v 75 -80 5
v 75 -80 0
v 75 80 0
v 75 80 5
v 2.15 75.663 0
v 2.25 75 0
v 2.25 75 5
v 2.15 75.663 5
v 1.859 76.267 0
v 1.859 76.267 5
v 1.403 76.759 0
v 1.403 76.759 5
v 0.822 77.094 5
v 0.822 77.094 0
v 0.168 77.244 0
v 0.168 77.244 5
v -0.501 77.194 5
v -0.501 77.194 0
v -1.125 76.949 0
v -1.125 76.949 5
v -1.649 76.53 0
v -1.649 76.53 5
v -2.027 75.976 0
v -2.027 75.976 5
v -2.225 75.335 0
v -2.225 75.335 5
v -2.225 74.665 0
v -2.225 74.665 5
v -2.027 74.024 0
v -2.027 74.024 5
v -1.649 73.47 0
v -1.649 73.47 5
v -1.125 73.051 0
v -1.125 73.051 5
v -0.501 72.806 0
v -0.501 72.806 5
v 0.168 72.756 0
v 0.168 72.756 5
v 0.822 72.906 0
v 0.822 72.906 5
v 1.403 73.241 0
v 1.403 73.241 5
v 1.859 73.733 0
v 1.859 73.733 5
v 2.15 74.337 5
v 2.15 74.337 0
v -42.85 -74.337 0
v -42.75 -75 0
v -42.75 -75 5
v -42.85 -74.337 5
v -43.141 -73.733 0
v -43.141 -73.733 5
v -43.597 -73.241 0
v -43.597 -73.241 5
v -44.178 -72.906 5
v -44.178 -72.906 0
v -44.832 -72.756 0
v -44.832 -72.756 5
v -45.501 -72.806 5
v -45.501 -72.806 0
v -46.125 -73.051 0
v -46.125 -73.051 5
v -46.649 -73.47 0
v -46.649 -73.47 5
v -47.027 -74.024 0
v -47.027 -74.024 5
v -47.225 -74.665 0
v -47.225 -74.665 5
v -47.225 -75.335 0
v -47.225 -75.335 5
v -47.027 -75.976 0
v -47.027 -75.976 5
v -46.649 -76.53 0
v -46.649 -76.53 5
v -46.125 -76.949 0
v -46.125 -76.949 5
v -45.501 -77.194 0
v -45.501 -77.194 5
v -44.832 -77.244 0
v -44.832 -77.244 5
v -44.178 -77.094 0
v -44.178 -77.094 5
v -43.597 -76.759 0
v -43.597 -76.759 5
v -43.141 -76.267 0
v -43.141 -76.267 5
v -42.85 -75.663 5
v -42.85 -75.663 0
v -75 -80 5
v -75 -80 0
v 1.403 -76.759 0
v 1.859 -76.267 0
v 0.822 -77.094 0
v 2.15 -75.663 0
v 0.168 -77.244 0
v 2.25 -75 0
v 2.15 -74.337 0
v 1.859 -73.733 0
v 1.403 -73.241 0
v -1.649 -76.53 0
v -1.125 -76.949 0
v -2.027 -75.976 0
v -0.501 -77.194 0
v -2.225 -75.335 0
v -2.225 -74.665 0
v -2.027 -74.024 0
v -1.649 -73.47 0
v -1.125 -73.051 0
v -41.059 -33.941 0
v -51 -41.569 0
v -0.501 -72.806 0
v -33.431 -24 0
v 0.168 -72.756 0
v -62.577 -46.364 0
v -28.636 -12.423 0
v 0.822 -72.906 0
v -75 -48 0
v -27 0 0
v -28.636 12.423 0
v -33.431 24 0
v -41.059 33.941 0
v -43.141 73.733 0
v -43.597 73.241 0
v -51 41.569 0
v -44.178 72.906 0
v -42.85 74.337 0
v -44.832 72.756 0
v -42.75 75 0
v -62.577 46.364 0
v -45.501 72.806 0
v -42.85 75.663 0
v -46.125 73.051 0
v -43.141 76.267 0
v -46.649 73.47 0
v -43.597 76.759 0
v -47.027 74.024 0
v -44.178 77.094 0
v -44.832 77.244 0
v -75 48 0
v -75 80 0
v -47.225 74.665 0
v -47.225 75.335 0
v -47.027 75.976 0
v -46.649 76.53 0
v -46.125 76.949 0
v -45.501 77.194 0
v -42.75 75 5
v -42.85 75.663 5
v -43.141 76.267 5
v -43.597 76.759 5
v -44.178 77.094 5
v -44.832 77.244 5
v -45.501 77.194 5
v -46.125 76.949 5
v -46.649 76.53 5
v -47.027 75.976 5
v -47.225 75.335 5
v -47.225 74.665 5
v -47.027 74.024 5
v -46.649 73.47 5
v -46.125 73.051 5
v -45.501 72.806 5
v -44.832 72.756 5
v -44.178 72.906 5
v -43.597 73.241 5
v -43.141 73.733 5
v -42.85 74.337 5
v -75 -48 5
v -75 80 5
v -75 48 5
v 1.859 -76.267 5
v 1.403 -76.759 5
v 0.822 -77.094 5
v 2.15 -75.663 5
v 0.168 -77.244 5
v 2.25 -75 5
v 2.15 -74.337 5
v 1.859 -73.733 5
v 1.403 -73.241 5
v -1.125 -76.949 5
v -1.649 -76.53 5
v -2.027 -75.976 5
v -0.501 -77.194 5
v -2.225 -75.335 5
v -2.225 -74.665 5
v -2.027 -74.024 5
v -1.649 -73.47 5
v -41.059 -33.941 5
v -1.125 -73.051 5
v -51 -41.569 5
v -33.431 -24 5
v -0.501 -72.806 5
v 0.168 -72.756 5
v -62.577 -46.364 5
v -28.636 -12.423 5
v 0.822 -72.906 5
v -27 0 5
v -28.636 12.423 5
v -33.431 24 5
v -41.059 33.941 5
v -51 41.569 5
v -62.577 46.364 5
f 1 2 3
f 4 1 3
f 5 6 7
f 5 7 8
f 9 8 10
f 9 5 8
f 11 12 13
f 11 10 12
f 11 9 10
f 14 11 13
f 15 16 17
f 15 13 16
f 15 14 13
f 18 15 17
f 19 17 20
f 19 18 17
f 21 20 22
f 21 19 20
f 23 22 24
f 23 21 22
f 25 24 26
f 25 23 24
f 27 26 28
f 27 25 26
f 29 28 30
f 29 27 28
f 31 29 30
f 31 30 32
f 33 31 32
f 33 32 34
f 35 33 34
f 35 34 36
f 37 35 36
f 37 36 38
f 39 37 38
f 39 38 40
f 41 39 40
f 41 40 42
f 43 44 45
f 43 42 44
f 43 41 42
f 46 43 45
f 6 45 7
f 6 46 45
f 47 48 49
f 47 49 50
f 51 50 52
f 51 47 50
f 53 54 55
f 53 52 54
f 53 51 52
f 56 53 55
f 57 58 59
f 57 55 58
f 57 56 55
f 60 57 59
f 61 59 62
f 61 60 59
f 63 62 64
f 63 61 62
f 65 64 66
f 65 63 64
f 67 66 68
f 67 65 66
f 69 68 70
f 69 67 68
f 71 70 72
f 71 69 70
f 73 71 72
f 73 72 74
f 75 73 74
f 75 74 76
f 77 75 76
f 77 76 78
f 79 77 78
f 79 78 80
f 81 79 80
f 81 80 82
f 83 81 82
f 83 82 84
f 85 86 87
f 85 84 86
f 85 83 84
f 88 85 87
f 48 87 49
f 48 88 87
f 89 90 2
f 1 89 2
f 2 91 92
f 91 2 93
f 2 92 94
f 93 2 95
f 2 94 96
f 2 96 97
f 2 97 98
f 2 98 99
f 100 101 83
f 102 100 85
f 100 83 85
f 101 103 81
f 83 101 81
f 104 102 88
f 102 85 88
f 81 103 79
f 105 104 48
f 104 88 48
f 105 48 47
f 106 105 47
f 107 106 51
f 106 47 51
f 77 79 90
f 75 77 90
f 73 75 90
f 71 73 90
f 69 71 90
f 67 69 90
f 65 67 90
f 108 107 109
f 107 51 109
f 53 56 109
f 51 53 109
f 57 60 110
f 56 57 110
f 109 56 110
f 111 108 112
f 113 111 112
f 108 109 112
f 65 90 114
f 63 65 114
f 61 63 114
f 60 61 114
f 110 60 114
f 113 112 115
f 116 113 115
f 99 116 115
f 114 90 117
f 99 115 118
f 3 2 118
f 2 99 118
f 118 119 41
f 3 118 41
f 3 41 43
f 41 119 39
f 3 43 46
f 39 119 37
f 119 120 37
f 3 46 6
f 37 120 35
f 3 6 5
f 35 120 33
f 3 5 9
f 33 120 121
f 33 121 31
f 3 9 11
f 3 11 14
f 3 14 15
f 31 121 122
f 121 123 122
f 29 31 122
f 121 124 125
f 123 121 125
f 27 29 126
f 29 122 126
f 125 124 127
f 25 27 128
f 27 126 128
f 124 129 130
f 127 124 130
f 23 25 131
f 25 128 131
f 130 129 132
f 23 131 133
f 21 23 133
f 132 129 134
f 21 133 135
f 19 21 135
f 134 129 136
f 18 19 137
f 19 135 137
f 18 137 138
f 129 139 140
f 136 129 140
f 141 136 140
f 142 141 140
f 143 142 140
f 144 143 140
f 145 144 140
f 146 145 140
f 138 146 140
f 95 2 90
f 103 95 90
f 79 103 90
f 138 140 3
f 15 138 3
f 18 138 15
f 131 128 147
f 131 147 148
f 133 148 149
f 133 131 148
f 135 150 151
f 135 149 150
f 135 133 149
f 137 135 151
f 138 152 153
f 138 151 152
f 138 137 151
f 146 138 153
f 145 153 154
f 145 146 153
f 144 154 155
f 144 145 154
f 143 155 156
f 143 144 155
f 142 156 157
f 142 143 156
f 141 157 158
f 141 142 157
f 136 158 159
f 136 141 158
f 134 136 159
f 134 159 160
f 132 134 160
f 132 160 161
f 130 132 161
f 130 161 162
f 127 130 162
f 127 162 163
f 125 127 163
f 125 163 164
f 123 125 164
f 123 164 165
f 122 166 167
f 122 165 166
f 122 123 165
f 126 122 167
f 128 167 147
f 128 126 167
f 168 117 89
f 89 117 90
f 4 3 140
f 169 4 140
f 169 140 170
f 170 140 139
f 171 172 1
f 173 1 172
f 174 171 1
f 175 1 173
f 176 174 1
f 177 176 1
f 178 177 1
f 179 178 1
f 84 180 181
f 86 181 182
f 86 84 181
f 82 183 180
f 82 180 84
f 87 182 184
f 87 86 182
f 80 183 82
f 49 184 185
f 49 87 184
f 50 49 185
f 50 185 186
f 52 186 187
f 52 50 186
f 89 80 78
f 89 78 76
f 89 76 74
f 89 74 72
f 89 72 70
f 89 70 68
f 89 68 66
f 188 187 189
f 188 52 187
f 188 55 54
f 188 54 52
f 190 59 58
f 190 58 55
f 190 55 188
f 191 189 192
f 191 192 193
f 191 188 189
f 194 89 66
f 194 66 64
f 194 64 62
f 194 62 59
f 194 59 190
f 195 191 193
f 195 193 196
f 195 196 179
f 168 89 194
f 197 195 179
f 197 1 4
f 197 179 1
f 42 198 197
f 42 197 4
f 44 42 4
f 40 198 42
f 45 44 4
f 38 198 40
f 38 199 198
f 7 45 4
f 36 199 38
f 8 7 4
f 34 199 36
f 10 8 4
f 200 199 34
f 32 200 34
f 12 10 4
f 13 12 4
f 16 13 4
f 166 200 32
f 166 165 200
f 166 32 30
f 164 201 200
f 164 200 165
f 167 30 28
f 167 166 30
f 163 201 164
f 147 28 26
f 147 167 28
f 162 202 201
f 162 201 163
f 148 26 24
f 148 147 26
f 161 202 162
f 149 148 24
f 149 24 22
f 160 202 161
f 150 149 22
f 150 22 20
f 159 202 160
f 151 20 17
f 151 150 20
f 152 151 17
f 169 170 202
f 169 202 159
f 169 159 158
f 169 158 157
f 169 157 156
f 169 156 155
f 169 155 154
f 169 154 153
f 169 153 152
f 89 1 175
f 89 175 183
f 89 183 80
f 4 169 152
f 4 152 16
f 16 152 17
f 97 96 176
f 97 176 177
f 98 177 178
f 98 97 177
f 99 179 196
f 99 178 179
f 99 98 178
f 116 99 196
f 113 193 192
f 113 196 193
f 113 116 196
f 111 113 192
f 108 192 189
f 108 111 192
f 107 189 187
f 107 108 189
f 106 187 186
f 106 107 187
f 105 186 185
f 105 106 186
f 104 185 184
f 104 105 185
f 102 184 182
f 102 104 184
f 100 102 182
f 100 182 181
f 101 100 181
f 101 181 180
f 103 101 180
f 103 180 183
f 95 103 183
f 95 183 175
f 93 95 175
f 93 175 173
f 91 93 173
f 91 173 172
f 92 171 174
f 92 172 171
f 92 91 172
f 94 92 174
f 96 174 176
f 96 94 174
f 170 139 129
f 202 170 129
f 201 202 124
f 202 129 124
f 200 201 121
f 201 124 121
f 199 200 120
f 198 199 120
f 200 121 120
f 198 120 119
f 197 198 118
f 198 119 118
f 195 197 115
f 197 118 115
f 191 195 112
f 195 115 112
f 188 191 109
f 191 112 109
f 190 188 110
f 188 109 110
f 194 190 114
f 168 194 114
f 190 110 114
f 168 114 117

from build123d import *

# Parameters (mm, degrees)
BOSS_EXTRUDE1_DEPTH     = 5
CUT_EXTRUDE1_DEPTH      = 110.772492001
CUT_EXTRUDE1_DEPTH_BACK = 110.772492001
SKETCH2_R               = 2.25


with BuildPart() as part:
    # Sketch1 → Boss-Extrude1 (new body)
    with BuildSketch(Plane(origin=(0, 0, 0), x_dir=(0, 1, 0), z_dir=(0, 0, 1))):
        with BuildLine():
            Line((-48, 75), (-80, 75))
            Line((-80, 75), (-80, -75))
            Line((-80, -75), (80, -75))
            Line((80, -75), (80, 75))
            Line((80, 75), (48, 75))
            ThreePointArc((48, 75), (0, 27), (-48, 75))
        make_face()
    extrude(amount=BOSS_EXTRUDE1_DEPTH)

    # Sketch2 → Cut-Extrude1 (cut, two sides: drawn at the far end of the back side and taken through both)
    with BuildSketch(Plane.XY.offset(5).offset(-CUT_EXTRUDE1_DEPTH_BACK)):
        with Locations((0, -75)):
            Circle(SKETCH2_R)
        with Locations((-45, -75)):
            Circle(SKETCH2_R)
        with Locations((0, 75)):
            Circle(SKETCH2_R)
        with Locations((-45, 75)):
            Circle(SKETCH2_R)
    extrude(amount=CUT_EXTRUDE1_DEPTH + CUT_EXTRUDE1_DEPTH_BACK, mode=Mode.SUBTRACT)


solid = part.part
